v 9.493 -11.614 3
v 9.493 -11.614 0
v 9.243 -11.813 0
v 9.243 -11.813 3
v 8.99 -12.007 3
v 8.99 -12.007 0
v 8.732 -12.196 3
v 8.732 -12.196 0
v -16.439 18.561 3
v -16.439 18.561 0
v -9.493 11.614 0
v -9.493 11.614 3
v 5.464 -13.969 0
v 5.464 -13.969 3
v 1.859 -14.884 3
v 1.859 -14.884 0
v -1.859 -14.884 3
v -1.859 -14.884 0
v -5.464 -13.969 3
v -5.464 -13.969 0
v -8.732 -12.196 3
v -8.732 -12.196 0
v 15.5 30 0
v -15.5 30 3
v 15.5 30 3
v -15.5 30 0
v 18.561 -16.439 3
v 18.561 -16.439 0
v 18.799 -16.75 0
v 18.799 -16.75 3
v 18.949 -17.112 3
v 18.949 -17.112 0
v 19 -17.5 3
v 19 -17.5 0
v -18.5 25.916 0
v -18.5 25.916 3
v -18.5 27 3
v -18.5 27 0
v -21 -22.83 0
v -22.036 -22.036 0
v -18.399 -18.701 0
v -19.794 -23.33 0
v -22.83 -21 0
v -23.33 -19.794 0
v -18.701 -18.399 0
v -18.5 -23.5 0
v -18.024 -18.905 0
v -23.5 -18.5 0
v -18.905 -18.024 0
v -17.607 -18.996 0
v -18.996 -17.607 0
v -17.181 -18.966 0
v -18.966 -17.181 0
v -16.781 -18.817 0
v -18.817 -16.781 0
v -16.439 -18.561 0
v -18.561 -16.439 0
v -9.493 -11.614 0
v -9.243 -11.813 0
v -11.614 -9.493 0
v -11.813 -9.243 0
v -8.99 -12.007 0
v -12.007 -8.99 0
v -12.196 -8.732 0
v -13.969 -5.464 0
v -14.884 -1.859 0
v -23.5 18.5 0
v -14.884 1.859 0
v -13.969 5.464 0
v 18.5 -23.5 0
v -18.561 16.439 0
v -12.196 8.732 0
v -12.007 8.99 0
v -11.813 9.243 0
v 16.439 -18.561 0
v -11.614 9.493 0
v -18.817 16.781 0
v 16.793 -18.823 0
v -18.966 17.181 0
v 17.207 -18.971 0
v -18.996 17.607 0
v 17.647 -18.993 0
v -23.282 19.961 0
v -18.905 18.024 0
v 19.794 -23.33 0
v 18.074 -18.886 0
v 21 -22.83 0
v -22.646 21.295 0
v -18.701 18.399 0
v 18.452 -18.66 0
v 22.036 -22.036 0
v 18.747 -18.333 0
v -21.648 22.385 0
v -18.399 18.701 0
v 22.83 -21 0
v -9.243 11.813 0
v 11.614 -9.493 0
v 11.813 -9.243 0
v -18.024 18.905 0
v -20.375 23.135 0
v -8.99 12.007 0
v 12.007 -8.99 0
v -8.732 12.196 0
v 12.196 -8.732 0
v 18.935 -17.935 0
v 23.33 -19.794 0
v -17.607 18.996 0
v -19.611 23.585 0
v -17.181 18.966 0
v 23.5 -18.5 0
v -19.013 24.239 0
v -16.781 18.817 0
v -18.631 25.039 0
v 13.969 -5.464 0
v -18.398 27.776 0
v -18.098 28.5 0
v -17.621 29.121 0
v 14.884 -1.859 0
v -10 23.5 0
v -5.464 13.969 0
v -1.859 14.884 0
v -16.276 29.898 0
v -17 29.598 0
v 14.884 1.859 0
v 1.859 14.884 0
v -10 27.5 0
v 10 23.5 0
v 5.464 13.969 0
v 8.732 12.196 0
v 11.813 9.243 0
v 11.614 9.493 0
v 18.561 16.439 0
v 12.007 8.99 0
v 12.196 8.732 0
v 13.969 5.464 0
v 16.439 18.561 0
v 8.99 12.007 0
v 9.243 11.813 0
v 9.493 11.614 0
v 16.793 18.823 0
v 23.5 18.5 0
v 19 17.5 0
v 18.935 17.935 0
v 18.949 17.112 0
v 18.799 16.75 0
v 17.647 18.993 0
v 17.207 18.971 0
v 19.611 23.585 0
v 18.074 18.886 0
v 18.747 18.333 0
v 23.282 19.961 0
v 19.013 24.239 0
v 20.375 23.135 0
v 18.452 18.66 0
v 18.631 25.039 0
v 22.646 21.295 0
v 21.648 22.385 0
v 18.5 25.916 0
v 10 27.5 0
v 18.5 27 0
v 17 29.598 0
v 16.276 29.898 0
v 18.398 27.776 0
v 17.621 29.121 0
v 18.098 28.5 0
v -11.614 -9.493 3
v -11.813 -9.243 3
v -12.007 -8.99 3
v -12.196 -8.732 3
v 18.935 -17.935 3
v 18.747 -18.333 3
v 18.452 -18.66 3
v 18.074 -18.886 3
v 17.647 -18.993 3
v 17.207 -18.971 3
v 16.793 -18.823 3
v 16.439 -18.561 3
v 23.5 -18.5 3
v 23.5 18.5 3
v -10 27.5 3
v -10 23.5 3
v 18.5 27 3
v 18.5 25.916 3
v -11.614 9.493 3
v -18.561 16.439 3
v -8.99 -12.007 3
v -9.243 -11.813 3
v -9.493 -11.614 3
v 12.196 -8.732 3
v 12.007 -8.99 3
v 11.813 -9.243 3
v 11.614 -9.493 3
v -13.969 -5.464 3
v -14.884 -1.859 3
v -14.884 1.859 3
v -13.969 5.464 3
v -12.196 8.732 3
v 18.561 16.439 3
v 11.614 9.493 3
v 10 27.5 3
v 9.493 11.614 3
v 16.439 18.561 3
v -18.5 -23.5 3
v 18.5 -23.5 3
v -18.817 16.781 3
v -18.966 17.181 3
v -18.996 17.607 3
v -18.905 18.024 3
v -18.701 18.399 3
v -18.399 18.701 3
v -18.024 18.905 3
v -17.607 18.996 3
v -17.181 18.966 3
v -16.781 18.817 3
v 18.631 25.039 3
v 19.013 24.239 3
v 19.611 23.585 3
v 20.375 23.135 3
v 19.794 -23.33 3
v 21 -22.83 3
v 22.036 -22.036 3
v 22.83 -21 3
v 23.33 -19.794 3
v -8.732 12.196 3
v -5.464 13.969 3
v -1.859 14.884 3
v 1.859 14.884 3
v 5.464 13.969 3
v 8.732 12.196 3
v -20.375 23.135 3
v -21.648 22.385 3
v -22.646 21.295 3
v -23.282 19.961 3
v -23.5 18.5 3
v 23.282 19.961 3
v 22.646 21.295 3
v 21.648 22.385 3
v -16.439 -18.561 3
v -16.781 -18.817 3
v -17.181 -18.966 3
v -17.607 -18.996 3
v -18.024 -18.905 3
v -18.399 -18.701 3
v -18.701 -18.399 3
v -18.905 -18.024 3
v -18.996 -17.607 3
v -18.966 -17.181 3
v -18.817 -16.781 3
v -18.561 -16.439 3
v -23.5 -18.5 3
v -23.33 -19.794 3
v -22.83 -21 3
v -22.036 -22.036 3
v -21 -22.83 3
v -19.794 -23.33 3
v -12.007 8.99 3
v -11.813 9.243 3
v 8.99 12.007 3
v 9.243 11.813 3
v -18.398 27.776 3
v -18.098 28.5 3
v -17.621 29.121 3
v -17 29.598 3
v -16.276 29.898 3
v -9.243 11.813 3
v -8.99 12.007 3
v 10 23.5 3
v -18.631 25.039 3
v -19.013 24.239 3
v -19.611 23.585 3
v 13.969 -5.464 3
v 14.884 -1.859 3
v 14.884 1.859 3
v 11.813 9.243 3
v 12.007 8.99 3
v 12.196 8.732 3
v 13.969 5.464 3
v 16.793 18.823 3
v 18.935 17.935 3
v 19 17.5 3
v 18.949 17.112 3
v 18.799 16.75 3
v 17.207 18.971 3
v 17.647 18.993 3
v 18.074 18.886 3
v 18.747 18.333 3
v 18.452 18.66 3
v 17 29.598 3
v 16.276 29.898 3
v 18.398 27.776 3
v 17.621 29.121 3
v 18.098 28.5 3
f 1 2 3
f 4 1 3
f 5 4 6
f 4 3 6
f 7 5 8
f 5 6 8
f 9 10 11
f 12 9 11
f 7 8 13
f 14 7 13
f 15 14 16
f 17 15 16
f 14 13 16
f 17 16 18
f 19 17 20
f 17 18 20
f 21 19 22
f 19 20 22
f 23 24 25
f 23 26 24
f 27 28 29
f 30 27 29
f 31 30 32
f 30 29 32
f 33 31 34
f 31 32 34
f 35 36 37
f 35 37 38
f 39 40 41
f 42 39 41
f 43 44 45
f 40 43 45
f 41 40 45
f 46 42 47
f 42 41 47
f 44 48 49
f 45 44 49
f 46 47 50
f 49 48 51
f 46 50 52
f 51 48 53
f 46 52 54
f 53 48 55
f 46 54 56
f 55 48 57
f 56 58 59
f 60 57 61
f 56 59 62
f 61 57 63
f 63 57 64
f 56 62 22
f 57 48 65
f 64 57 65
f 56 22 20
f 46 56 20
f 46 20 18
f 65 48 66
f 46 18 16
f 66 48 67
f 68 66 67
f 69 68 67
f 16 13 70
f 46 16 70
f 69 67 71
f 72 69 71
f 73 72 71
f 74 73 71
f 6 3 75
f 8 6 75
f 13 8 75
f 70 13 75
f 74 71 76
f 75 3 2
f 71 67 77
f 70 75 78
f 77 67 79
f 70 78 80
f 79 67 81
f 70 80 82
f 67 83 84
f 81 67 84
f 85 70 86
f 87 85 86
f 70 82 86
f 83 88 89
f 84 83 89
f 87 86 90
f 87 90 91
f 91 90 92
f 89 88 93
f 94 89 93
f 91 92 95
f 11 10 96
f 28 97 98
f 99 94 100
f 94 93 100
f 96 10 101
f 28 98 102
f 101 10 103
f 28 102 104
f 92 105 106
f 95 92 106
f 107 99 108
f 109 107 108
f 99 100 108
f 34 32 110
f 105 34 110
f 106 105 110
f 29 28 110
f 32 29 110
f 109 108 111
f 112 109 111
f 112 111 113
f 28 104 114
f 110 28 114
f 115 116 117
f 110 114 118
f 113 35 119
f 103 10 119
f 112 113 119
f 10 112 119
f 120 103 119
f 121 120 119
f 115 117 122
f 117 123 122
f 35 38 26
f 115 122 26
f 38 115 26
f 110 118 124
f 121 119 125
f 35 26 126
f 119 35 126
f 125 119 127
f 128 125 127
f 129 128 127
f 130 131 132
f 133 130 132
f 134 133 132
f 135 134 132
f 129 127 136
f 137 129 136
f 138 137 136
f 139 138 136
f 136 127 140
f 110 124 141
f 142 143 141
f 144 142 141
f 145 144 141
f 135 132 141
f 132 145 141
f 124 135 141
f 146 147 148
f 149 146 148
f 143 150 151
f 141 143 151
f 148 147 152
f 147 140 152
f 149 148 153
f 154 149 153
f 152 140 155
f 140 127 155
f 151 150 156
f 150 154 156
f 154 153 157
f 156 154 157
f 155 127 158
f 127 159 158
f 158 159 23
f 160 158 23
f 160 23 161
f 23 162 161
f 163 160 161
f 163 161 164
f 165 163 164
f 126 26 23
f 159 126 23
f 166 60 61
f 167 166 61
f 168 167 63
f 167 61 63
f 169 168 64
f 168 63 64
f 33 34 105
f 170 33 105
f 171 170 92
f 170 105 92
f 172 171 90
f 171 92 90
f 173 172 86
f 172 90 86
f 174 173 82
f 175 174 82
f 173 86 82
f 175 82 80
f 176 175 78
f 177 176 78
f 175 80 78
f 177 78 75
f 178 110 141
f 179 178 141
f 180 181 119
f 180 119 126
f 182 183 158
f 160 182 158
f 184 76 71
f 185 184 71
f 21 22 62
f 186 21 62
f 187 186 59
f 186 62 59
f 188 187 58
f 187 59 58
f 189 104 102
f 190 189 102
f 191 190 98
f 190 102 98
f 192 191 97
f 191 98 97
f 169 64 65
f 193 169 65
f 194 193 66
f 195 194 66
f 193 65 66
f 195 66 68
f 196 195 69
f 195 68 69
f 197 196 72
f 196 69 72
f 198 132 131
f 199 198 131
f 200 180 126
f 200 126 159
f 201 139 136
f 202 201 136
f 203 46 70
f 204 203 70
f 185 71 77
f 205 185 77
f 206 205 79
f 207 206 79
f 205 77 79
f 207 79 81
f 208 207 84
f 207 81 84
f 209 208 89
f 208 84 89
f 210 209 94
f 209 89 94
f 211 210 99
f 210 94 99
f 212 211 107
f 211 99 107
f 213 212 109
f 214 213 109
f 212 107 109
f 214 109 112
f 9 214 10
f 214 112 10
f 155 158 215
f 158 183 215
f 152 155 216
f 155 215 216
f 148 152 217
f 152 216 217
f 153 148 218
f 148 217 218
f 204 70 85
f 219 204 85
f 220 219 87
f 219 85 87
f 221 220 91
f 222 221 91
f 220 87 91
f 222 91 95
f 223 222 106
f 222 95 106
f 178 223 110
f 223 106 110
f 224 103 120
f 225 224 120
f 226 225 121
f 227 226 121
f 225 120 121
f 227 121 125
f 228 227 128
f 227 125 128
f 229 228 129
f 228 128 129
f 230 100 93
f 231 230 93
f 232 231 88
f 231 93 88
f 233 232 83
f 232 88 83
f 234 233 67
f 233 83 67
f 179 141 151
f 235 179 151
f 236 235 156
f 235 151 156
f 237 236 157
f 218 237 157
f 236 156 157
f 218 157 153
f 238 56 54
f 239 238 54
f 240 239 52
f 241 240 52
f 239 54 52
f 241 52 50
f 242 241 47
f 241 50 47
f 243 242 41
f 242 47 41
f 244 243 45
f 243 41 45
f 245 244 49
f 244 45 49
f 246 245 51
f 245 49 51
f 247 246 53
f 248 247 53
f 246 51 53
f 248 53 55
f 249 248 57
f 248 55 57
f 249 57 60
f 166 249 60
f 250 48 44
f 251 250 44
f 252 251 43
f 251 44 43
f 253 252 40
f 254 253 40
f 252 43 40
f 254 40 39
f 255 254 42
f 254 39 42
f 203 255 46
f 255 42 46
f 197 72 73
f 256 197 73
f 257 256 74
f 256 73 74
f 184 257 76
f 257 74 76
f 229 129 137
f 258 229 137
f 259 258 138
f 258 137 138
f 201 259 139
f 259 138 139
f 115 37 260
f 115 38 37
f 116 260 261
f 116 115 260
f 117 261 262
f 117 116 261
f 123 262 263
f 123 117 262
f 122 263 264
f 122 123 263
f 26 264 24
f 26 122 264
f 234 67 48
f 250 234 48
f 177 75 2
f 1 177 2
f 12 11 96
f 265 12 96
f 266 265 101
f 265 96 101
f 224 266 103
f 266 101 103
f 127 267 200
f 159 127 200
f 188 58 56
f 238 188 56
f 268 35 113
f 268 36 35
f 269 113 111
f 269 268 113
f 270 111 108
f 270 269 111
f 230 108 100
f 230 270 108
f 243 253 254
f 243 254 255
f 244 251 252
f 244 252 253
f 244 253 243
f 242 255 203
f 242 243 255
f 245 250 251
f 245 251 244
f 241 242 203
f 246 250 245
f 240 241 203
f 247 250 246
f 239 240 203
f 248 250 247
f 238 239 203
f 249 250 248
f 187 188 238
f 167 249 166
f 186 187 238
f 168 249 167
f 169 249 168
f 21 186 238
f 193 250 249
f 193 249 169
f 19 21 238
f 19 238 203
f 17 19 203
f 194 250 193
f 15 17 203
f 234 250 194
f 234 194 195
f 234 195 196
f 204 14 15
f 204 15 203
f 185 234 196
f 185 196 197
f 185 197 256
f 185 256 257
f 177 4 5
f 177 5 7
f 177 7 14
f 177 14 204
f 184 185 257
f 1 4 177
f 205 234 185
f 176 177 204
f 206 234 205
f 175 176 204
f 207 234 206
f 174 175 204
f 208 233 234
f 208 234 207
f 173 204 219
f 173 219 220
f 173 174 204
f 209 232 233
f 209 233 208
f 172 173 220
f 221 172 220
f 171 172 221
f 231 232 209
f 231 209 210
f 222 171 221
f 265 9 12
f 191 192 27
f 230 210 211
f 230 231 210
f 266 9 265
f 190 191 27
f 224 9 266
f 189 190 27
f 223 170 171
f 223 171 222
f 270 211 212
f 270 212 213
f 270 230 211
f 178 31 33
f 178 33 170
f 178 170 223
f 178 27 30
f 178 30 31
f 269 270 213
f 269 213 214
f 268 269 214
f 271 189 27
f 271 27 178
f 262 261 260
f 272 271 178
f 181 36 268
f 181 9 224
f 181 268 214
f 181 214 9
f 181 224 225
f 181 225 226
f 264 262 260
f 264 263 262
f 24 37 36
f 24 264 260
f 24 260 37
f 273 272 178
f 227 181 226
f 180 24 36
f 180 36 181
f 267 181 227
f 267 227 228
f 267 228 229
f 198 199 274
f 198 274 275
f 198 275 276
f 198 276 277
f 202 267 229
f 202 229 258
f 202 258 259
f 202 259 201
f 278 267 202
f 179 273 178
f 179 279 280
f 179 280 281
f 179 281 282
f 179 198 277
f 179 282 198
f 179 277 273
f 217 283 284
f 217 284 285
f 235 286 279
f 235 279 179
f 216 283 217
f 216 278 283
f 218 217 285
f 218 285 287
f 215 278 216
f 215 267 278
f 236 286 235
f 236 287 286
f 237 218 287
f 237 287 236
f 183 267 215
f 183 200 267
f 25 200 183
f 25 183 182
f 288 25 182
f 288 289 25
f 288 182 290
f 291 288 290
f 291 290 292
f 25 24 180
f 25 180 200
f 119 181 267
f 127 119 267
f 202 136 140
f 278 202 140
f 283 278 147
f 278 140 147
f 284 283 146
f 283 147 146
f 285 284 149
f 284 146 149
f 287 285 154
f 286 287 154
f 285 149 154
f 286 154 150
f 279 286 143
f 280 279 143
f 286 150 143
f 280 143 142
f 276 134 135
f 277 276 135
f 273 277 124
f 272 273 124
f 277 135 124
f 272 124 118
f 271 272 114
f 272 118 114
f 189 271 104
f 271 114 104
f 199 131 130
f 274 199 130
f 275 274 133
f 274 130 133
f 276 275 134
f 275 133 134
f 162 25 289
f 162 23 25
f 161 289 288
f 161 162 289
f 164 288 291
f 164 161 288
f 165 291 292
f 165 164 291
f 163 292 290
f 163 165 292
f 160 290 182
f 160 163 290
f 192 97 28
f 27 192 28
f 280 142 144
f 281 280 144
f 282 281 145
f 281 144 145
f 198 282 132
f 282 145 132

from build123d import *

# Parameters (mm, degrees)
EXTRUDE_1_DEPTH     = 3
SKETCH_2_W          = 37
SKETCH_2_H          = 3
EXTRUDE_2_DEPTH     = 6.5
SKETCH_3_W          = 20
SKETCH_3_H          = 4
CUT_EXTRUDE_1_DEPTH = 5
FILLET_2_R          = 3
EXTRUDE_START       = -3
EXTRUDE_4_DEPTH     = 3


with BuildPart() as part:
    # 草图1 → 凸台-拉伸1 (new body)
    with BuildSketch(Plane.XY):
        with BuildLine():
            Line((18.5, 23.5), (-18.5, 23.5))
            ThreePointArc((-18.5, 23.5), (-22.035533906, 22.035533906), (-23.5, 18.5))
            Line((-23.5, 18.5), (-23.5, -18.5))
            ThreePointArc((-23.5, -18.5), (-22.035533906, -22.035533906), (-18.5, -23.5))
            Line((-18.5, -23.5), (18.5, -23.5))
            ThreePointArc((18.5, -23.5), (22.035533906, -22.035533906), (23.5, -18.5))
            Line((23.5, -18.5), (23.5, 18.5))
            ThreePointArc((23.5, 18.5), (22.035533906, 22.035533906), (18.5, 23.5))
        make_face()
        with BuildLine():
            Line((-12.196084122, 8.732441359), (-19.231821381, 15.768178619))
            ThreePointArc((-19.231821381, 15.768178619), (-19.231821381, 19.231821381), (-15.768178619, 19.231821381))
            Line((-15.768178619, 19.231821381), (-8.732441359, 12.196084122))
            ThreePointArc((-8.732441359, 12.196084122), (0, 15), (8.732441359, 12.196084122))
            Line((8.732441359, 12.196084122), (15.768178619, 19.231821381))
            ThreePointArc((15.768178619, 19.231821381), (19.231821381, 19.231821381), (19.231821381, 15.768178619))
            Line((19.231821381, 15.768178619), (12.196084122, 8.732441359))
            ThreePointArc((12.196084122, 8.732441359), (15, 0), (12.196084122, -8.732441359))
            Line((12.196084122, -8.732441359), (19.231821381, -15.768178619))
            ThreePointArc((19.231821381, -15.768178619), (19.231821381, -19.231821381), (15.768178619, -19.231821381))
            Line((15.768178619, -19.231821381), (8.732441359, -12.196084122))
            ThreePointArc((8.732441359, -12.196084122), (0, -15), (-8.732441359, -12.196084122))
            Line((-8.732441359, -12.196084122), (-15.768178619, -19.231821381))
            ThreePointArc((-15.768178619, -19.231821381), (-19.231821381, -19.231821381), (-19.231821381, -15.768178619))
            Line((-19.231821381, -15.768178619), (-12.196084122, -8.732441359))
            ThreePointArc((-12.196084122, -8.732441359), (-15, 0), (-12.196084122, 8.732441359))
        make_face(mode=Mode.SUBTRACT)
    extrude(amount=EXTRUDE_1_DEPTH)

    # 草图2 → 凸台-拉伸2 (add)
    with BuildSketch(Plane(origin=(0, 23.5, 0), x_dir=(1, 0, 0), z_dir=(0, 1, 0))):
        with Locations((0, -1.5)):
            Rectangle(SKETCH_2_W, SKETCH_2_H)
    extrude(amount=EXTRUDE_2_DEPTH)

    # 草图3 → 切除-拉伸1 (cut)
    with BuildSketch(Plane.XY.offset(3)):
        with Locations((0, 25.5)):
            Rectangle(SKETCH_3_W, SKETCH_3_H)
    extrude(amount=-CUT_EXTRUDE_1_DEPTH, mode=Mode.SUBTRACT)

    # 圆角2
    fillet_2_edges = [part.edges().sort_by_distance(p)[0] for p in [
        (18.5, 23.5, 1.5),
        (18.5, 30, 1.5),
        (-18.5, 30, 1.5),
        (-18.5, 23.5, 1.5),
    ]]
    fillet(fillet_2_edges, radius=FILLET_2_R)

    # 草图5 → 凸台-拉伸4 (add)
    with BuildSketch(Plane.XY.offset(3).offset(EXTRUDE_START)):
        with BuildLine():
            ThreePointArc((-15.768178619, 19.231821381), (-19.231821381, 19.231821381), (-19.231821381, 15.768178619))
            Line((-19.231821381, 15.768178619), (-12.196084122, 8.732441359))
            ThreePointArc((-12.196084122, 8.732441359), (-11.911158294, 9.11725332), (-11.614095631, 9.492775288))
            Line((-11.614095631, 9.492775288), (-18.560660172, 16.439339828))
            ThreePointArc((-18.560660172, 16.439339828), (-18.560660172, 18.560660172), (-16.439339828, 18.560660172))
            Line((-16.439339828, 18.560660172), (-9.492775288, 11.614095631))
            ThreePointArc((-9.492775288, 11.614095631), (-9.11725332, 11.911158294), (-8.732441359, 12.196084122))
            Line((-8.732441359, 12.196084122), (-15.768178619, 19.231821381))
        make_face()
        with BuildLine():
            ThreePointArc((-11.614095631, -9.492775288), (-11.911158294, -9.11725332), (-12.196084122, -8.732441359))
            Line((-12.196084122, -8.732441359), (-19.231821381, -15.768178619))
            ThreePointArc((-19.231821381, -15.768178619), (-19.231821381, -19.231821381), (-15.768178619, -19.231821381))
            Line((-15.768178619, -19.231821381), (-8.732441359, -12.196084122))
            ThreePointArc((-8.732441359, -12.196084122), (-9.11725332, -11.911158294), (-9.492775288, -11.614095631))
            Line((-9.492775288, -11.614095631), (-16.439339828, -18.560660172))
            ThreePointArc((-16.439339828, -18.560660172), (-18.560660172, -18.560660172), (-18.560660172, -16.439339828))
            Line((-18.560660172, -16.439339828), (-11.614095631, -9.492775288))
        make_face()
        with BuildLine():
            Line((15.768178619, 19.231821381), (8.732441359, 12.196084122))
            ThreePointArc((8.732441359, 12.196084122), (9.11725332, 11.911158294), (9.492775288, 11.614095631))
            Line((9.492775288, 11.614095631), (16.439339828, 18.560660172))
            ThreePointArc((16.439339828, 18.560660172), (18.560660172, 18.560660172), (18.560660172, 16.439339828))
            Line((18.560660172, 16.439339828), (11.614095631, 9.492775288))
            ThreePointArc((11.614095631, 9.492775288), (11.911158294, 9.11725332), (12.196084122, 8.732441359))
            Line((12.196084122, 8.732441359), (19.231821381, 15.768178619))
            ThreePointArc((19.231821381, 15.768178619), (19.231821381, 19.231821381), (15.768178619, 19.231821381))
        make_face()
        with BuildLine():
            ThreePointArc((9.492775288, -11.614095631), (9.11725332, -11.911158294), (8.732441359, -12.196084122))
            Line((8.732441359, -12.196084122), (15.768178619, -19.231821381))
            ThreePointArc((15.768178619, -19.231821381), (19.231821381, -19.231821381), (19.231821381, -15.768178619))
            Line((19.231821381, -15.768178619), (12.196084122, -8.732441359))
            ThreePointArc((12.196084122, -8.732441359), (11.911158294, -9.11725332), (11.614095631, -9.492775288))
            Line((11.614095631, -9.492775288), (18.560660172, -16.439339828))
            ThreePointArc((18.560660172, -16.439339828), (18.560660172, -18.560660172), (16.439339828, -18.560660172))
            Line((16.439339828, -18.560660172), (9.492775288, -11.614095631))
        make_face()
    extrude(amount=EXTRUDE_4_DEPTH)


solid = part.part
